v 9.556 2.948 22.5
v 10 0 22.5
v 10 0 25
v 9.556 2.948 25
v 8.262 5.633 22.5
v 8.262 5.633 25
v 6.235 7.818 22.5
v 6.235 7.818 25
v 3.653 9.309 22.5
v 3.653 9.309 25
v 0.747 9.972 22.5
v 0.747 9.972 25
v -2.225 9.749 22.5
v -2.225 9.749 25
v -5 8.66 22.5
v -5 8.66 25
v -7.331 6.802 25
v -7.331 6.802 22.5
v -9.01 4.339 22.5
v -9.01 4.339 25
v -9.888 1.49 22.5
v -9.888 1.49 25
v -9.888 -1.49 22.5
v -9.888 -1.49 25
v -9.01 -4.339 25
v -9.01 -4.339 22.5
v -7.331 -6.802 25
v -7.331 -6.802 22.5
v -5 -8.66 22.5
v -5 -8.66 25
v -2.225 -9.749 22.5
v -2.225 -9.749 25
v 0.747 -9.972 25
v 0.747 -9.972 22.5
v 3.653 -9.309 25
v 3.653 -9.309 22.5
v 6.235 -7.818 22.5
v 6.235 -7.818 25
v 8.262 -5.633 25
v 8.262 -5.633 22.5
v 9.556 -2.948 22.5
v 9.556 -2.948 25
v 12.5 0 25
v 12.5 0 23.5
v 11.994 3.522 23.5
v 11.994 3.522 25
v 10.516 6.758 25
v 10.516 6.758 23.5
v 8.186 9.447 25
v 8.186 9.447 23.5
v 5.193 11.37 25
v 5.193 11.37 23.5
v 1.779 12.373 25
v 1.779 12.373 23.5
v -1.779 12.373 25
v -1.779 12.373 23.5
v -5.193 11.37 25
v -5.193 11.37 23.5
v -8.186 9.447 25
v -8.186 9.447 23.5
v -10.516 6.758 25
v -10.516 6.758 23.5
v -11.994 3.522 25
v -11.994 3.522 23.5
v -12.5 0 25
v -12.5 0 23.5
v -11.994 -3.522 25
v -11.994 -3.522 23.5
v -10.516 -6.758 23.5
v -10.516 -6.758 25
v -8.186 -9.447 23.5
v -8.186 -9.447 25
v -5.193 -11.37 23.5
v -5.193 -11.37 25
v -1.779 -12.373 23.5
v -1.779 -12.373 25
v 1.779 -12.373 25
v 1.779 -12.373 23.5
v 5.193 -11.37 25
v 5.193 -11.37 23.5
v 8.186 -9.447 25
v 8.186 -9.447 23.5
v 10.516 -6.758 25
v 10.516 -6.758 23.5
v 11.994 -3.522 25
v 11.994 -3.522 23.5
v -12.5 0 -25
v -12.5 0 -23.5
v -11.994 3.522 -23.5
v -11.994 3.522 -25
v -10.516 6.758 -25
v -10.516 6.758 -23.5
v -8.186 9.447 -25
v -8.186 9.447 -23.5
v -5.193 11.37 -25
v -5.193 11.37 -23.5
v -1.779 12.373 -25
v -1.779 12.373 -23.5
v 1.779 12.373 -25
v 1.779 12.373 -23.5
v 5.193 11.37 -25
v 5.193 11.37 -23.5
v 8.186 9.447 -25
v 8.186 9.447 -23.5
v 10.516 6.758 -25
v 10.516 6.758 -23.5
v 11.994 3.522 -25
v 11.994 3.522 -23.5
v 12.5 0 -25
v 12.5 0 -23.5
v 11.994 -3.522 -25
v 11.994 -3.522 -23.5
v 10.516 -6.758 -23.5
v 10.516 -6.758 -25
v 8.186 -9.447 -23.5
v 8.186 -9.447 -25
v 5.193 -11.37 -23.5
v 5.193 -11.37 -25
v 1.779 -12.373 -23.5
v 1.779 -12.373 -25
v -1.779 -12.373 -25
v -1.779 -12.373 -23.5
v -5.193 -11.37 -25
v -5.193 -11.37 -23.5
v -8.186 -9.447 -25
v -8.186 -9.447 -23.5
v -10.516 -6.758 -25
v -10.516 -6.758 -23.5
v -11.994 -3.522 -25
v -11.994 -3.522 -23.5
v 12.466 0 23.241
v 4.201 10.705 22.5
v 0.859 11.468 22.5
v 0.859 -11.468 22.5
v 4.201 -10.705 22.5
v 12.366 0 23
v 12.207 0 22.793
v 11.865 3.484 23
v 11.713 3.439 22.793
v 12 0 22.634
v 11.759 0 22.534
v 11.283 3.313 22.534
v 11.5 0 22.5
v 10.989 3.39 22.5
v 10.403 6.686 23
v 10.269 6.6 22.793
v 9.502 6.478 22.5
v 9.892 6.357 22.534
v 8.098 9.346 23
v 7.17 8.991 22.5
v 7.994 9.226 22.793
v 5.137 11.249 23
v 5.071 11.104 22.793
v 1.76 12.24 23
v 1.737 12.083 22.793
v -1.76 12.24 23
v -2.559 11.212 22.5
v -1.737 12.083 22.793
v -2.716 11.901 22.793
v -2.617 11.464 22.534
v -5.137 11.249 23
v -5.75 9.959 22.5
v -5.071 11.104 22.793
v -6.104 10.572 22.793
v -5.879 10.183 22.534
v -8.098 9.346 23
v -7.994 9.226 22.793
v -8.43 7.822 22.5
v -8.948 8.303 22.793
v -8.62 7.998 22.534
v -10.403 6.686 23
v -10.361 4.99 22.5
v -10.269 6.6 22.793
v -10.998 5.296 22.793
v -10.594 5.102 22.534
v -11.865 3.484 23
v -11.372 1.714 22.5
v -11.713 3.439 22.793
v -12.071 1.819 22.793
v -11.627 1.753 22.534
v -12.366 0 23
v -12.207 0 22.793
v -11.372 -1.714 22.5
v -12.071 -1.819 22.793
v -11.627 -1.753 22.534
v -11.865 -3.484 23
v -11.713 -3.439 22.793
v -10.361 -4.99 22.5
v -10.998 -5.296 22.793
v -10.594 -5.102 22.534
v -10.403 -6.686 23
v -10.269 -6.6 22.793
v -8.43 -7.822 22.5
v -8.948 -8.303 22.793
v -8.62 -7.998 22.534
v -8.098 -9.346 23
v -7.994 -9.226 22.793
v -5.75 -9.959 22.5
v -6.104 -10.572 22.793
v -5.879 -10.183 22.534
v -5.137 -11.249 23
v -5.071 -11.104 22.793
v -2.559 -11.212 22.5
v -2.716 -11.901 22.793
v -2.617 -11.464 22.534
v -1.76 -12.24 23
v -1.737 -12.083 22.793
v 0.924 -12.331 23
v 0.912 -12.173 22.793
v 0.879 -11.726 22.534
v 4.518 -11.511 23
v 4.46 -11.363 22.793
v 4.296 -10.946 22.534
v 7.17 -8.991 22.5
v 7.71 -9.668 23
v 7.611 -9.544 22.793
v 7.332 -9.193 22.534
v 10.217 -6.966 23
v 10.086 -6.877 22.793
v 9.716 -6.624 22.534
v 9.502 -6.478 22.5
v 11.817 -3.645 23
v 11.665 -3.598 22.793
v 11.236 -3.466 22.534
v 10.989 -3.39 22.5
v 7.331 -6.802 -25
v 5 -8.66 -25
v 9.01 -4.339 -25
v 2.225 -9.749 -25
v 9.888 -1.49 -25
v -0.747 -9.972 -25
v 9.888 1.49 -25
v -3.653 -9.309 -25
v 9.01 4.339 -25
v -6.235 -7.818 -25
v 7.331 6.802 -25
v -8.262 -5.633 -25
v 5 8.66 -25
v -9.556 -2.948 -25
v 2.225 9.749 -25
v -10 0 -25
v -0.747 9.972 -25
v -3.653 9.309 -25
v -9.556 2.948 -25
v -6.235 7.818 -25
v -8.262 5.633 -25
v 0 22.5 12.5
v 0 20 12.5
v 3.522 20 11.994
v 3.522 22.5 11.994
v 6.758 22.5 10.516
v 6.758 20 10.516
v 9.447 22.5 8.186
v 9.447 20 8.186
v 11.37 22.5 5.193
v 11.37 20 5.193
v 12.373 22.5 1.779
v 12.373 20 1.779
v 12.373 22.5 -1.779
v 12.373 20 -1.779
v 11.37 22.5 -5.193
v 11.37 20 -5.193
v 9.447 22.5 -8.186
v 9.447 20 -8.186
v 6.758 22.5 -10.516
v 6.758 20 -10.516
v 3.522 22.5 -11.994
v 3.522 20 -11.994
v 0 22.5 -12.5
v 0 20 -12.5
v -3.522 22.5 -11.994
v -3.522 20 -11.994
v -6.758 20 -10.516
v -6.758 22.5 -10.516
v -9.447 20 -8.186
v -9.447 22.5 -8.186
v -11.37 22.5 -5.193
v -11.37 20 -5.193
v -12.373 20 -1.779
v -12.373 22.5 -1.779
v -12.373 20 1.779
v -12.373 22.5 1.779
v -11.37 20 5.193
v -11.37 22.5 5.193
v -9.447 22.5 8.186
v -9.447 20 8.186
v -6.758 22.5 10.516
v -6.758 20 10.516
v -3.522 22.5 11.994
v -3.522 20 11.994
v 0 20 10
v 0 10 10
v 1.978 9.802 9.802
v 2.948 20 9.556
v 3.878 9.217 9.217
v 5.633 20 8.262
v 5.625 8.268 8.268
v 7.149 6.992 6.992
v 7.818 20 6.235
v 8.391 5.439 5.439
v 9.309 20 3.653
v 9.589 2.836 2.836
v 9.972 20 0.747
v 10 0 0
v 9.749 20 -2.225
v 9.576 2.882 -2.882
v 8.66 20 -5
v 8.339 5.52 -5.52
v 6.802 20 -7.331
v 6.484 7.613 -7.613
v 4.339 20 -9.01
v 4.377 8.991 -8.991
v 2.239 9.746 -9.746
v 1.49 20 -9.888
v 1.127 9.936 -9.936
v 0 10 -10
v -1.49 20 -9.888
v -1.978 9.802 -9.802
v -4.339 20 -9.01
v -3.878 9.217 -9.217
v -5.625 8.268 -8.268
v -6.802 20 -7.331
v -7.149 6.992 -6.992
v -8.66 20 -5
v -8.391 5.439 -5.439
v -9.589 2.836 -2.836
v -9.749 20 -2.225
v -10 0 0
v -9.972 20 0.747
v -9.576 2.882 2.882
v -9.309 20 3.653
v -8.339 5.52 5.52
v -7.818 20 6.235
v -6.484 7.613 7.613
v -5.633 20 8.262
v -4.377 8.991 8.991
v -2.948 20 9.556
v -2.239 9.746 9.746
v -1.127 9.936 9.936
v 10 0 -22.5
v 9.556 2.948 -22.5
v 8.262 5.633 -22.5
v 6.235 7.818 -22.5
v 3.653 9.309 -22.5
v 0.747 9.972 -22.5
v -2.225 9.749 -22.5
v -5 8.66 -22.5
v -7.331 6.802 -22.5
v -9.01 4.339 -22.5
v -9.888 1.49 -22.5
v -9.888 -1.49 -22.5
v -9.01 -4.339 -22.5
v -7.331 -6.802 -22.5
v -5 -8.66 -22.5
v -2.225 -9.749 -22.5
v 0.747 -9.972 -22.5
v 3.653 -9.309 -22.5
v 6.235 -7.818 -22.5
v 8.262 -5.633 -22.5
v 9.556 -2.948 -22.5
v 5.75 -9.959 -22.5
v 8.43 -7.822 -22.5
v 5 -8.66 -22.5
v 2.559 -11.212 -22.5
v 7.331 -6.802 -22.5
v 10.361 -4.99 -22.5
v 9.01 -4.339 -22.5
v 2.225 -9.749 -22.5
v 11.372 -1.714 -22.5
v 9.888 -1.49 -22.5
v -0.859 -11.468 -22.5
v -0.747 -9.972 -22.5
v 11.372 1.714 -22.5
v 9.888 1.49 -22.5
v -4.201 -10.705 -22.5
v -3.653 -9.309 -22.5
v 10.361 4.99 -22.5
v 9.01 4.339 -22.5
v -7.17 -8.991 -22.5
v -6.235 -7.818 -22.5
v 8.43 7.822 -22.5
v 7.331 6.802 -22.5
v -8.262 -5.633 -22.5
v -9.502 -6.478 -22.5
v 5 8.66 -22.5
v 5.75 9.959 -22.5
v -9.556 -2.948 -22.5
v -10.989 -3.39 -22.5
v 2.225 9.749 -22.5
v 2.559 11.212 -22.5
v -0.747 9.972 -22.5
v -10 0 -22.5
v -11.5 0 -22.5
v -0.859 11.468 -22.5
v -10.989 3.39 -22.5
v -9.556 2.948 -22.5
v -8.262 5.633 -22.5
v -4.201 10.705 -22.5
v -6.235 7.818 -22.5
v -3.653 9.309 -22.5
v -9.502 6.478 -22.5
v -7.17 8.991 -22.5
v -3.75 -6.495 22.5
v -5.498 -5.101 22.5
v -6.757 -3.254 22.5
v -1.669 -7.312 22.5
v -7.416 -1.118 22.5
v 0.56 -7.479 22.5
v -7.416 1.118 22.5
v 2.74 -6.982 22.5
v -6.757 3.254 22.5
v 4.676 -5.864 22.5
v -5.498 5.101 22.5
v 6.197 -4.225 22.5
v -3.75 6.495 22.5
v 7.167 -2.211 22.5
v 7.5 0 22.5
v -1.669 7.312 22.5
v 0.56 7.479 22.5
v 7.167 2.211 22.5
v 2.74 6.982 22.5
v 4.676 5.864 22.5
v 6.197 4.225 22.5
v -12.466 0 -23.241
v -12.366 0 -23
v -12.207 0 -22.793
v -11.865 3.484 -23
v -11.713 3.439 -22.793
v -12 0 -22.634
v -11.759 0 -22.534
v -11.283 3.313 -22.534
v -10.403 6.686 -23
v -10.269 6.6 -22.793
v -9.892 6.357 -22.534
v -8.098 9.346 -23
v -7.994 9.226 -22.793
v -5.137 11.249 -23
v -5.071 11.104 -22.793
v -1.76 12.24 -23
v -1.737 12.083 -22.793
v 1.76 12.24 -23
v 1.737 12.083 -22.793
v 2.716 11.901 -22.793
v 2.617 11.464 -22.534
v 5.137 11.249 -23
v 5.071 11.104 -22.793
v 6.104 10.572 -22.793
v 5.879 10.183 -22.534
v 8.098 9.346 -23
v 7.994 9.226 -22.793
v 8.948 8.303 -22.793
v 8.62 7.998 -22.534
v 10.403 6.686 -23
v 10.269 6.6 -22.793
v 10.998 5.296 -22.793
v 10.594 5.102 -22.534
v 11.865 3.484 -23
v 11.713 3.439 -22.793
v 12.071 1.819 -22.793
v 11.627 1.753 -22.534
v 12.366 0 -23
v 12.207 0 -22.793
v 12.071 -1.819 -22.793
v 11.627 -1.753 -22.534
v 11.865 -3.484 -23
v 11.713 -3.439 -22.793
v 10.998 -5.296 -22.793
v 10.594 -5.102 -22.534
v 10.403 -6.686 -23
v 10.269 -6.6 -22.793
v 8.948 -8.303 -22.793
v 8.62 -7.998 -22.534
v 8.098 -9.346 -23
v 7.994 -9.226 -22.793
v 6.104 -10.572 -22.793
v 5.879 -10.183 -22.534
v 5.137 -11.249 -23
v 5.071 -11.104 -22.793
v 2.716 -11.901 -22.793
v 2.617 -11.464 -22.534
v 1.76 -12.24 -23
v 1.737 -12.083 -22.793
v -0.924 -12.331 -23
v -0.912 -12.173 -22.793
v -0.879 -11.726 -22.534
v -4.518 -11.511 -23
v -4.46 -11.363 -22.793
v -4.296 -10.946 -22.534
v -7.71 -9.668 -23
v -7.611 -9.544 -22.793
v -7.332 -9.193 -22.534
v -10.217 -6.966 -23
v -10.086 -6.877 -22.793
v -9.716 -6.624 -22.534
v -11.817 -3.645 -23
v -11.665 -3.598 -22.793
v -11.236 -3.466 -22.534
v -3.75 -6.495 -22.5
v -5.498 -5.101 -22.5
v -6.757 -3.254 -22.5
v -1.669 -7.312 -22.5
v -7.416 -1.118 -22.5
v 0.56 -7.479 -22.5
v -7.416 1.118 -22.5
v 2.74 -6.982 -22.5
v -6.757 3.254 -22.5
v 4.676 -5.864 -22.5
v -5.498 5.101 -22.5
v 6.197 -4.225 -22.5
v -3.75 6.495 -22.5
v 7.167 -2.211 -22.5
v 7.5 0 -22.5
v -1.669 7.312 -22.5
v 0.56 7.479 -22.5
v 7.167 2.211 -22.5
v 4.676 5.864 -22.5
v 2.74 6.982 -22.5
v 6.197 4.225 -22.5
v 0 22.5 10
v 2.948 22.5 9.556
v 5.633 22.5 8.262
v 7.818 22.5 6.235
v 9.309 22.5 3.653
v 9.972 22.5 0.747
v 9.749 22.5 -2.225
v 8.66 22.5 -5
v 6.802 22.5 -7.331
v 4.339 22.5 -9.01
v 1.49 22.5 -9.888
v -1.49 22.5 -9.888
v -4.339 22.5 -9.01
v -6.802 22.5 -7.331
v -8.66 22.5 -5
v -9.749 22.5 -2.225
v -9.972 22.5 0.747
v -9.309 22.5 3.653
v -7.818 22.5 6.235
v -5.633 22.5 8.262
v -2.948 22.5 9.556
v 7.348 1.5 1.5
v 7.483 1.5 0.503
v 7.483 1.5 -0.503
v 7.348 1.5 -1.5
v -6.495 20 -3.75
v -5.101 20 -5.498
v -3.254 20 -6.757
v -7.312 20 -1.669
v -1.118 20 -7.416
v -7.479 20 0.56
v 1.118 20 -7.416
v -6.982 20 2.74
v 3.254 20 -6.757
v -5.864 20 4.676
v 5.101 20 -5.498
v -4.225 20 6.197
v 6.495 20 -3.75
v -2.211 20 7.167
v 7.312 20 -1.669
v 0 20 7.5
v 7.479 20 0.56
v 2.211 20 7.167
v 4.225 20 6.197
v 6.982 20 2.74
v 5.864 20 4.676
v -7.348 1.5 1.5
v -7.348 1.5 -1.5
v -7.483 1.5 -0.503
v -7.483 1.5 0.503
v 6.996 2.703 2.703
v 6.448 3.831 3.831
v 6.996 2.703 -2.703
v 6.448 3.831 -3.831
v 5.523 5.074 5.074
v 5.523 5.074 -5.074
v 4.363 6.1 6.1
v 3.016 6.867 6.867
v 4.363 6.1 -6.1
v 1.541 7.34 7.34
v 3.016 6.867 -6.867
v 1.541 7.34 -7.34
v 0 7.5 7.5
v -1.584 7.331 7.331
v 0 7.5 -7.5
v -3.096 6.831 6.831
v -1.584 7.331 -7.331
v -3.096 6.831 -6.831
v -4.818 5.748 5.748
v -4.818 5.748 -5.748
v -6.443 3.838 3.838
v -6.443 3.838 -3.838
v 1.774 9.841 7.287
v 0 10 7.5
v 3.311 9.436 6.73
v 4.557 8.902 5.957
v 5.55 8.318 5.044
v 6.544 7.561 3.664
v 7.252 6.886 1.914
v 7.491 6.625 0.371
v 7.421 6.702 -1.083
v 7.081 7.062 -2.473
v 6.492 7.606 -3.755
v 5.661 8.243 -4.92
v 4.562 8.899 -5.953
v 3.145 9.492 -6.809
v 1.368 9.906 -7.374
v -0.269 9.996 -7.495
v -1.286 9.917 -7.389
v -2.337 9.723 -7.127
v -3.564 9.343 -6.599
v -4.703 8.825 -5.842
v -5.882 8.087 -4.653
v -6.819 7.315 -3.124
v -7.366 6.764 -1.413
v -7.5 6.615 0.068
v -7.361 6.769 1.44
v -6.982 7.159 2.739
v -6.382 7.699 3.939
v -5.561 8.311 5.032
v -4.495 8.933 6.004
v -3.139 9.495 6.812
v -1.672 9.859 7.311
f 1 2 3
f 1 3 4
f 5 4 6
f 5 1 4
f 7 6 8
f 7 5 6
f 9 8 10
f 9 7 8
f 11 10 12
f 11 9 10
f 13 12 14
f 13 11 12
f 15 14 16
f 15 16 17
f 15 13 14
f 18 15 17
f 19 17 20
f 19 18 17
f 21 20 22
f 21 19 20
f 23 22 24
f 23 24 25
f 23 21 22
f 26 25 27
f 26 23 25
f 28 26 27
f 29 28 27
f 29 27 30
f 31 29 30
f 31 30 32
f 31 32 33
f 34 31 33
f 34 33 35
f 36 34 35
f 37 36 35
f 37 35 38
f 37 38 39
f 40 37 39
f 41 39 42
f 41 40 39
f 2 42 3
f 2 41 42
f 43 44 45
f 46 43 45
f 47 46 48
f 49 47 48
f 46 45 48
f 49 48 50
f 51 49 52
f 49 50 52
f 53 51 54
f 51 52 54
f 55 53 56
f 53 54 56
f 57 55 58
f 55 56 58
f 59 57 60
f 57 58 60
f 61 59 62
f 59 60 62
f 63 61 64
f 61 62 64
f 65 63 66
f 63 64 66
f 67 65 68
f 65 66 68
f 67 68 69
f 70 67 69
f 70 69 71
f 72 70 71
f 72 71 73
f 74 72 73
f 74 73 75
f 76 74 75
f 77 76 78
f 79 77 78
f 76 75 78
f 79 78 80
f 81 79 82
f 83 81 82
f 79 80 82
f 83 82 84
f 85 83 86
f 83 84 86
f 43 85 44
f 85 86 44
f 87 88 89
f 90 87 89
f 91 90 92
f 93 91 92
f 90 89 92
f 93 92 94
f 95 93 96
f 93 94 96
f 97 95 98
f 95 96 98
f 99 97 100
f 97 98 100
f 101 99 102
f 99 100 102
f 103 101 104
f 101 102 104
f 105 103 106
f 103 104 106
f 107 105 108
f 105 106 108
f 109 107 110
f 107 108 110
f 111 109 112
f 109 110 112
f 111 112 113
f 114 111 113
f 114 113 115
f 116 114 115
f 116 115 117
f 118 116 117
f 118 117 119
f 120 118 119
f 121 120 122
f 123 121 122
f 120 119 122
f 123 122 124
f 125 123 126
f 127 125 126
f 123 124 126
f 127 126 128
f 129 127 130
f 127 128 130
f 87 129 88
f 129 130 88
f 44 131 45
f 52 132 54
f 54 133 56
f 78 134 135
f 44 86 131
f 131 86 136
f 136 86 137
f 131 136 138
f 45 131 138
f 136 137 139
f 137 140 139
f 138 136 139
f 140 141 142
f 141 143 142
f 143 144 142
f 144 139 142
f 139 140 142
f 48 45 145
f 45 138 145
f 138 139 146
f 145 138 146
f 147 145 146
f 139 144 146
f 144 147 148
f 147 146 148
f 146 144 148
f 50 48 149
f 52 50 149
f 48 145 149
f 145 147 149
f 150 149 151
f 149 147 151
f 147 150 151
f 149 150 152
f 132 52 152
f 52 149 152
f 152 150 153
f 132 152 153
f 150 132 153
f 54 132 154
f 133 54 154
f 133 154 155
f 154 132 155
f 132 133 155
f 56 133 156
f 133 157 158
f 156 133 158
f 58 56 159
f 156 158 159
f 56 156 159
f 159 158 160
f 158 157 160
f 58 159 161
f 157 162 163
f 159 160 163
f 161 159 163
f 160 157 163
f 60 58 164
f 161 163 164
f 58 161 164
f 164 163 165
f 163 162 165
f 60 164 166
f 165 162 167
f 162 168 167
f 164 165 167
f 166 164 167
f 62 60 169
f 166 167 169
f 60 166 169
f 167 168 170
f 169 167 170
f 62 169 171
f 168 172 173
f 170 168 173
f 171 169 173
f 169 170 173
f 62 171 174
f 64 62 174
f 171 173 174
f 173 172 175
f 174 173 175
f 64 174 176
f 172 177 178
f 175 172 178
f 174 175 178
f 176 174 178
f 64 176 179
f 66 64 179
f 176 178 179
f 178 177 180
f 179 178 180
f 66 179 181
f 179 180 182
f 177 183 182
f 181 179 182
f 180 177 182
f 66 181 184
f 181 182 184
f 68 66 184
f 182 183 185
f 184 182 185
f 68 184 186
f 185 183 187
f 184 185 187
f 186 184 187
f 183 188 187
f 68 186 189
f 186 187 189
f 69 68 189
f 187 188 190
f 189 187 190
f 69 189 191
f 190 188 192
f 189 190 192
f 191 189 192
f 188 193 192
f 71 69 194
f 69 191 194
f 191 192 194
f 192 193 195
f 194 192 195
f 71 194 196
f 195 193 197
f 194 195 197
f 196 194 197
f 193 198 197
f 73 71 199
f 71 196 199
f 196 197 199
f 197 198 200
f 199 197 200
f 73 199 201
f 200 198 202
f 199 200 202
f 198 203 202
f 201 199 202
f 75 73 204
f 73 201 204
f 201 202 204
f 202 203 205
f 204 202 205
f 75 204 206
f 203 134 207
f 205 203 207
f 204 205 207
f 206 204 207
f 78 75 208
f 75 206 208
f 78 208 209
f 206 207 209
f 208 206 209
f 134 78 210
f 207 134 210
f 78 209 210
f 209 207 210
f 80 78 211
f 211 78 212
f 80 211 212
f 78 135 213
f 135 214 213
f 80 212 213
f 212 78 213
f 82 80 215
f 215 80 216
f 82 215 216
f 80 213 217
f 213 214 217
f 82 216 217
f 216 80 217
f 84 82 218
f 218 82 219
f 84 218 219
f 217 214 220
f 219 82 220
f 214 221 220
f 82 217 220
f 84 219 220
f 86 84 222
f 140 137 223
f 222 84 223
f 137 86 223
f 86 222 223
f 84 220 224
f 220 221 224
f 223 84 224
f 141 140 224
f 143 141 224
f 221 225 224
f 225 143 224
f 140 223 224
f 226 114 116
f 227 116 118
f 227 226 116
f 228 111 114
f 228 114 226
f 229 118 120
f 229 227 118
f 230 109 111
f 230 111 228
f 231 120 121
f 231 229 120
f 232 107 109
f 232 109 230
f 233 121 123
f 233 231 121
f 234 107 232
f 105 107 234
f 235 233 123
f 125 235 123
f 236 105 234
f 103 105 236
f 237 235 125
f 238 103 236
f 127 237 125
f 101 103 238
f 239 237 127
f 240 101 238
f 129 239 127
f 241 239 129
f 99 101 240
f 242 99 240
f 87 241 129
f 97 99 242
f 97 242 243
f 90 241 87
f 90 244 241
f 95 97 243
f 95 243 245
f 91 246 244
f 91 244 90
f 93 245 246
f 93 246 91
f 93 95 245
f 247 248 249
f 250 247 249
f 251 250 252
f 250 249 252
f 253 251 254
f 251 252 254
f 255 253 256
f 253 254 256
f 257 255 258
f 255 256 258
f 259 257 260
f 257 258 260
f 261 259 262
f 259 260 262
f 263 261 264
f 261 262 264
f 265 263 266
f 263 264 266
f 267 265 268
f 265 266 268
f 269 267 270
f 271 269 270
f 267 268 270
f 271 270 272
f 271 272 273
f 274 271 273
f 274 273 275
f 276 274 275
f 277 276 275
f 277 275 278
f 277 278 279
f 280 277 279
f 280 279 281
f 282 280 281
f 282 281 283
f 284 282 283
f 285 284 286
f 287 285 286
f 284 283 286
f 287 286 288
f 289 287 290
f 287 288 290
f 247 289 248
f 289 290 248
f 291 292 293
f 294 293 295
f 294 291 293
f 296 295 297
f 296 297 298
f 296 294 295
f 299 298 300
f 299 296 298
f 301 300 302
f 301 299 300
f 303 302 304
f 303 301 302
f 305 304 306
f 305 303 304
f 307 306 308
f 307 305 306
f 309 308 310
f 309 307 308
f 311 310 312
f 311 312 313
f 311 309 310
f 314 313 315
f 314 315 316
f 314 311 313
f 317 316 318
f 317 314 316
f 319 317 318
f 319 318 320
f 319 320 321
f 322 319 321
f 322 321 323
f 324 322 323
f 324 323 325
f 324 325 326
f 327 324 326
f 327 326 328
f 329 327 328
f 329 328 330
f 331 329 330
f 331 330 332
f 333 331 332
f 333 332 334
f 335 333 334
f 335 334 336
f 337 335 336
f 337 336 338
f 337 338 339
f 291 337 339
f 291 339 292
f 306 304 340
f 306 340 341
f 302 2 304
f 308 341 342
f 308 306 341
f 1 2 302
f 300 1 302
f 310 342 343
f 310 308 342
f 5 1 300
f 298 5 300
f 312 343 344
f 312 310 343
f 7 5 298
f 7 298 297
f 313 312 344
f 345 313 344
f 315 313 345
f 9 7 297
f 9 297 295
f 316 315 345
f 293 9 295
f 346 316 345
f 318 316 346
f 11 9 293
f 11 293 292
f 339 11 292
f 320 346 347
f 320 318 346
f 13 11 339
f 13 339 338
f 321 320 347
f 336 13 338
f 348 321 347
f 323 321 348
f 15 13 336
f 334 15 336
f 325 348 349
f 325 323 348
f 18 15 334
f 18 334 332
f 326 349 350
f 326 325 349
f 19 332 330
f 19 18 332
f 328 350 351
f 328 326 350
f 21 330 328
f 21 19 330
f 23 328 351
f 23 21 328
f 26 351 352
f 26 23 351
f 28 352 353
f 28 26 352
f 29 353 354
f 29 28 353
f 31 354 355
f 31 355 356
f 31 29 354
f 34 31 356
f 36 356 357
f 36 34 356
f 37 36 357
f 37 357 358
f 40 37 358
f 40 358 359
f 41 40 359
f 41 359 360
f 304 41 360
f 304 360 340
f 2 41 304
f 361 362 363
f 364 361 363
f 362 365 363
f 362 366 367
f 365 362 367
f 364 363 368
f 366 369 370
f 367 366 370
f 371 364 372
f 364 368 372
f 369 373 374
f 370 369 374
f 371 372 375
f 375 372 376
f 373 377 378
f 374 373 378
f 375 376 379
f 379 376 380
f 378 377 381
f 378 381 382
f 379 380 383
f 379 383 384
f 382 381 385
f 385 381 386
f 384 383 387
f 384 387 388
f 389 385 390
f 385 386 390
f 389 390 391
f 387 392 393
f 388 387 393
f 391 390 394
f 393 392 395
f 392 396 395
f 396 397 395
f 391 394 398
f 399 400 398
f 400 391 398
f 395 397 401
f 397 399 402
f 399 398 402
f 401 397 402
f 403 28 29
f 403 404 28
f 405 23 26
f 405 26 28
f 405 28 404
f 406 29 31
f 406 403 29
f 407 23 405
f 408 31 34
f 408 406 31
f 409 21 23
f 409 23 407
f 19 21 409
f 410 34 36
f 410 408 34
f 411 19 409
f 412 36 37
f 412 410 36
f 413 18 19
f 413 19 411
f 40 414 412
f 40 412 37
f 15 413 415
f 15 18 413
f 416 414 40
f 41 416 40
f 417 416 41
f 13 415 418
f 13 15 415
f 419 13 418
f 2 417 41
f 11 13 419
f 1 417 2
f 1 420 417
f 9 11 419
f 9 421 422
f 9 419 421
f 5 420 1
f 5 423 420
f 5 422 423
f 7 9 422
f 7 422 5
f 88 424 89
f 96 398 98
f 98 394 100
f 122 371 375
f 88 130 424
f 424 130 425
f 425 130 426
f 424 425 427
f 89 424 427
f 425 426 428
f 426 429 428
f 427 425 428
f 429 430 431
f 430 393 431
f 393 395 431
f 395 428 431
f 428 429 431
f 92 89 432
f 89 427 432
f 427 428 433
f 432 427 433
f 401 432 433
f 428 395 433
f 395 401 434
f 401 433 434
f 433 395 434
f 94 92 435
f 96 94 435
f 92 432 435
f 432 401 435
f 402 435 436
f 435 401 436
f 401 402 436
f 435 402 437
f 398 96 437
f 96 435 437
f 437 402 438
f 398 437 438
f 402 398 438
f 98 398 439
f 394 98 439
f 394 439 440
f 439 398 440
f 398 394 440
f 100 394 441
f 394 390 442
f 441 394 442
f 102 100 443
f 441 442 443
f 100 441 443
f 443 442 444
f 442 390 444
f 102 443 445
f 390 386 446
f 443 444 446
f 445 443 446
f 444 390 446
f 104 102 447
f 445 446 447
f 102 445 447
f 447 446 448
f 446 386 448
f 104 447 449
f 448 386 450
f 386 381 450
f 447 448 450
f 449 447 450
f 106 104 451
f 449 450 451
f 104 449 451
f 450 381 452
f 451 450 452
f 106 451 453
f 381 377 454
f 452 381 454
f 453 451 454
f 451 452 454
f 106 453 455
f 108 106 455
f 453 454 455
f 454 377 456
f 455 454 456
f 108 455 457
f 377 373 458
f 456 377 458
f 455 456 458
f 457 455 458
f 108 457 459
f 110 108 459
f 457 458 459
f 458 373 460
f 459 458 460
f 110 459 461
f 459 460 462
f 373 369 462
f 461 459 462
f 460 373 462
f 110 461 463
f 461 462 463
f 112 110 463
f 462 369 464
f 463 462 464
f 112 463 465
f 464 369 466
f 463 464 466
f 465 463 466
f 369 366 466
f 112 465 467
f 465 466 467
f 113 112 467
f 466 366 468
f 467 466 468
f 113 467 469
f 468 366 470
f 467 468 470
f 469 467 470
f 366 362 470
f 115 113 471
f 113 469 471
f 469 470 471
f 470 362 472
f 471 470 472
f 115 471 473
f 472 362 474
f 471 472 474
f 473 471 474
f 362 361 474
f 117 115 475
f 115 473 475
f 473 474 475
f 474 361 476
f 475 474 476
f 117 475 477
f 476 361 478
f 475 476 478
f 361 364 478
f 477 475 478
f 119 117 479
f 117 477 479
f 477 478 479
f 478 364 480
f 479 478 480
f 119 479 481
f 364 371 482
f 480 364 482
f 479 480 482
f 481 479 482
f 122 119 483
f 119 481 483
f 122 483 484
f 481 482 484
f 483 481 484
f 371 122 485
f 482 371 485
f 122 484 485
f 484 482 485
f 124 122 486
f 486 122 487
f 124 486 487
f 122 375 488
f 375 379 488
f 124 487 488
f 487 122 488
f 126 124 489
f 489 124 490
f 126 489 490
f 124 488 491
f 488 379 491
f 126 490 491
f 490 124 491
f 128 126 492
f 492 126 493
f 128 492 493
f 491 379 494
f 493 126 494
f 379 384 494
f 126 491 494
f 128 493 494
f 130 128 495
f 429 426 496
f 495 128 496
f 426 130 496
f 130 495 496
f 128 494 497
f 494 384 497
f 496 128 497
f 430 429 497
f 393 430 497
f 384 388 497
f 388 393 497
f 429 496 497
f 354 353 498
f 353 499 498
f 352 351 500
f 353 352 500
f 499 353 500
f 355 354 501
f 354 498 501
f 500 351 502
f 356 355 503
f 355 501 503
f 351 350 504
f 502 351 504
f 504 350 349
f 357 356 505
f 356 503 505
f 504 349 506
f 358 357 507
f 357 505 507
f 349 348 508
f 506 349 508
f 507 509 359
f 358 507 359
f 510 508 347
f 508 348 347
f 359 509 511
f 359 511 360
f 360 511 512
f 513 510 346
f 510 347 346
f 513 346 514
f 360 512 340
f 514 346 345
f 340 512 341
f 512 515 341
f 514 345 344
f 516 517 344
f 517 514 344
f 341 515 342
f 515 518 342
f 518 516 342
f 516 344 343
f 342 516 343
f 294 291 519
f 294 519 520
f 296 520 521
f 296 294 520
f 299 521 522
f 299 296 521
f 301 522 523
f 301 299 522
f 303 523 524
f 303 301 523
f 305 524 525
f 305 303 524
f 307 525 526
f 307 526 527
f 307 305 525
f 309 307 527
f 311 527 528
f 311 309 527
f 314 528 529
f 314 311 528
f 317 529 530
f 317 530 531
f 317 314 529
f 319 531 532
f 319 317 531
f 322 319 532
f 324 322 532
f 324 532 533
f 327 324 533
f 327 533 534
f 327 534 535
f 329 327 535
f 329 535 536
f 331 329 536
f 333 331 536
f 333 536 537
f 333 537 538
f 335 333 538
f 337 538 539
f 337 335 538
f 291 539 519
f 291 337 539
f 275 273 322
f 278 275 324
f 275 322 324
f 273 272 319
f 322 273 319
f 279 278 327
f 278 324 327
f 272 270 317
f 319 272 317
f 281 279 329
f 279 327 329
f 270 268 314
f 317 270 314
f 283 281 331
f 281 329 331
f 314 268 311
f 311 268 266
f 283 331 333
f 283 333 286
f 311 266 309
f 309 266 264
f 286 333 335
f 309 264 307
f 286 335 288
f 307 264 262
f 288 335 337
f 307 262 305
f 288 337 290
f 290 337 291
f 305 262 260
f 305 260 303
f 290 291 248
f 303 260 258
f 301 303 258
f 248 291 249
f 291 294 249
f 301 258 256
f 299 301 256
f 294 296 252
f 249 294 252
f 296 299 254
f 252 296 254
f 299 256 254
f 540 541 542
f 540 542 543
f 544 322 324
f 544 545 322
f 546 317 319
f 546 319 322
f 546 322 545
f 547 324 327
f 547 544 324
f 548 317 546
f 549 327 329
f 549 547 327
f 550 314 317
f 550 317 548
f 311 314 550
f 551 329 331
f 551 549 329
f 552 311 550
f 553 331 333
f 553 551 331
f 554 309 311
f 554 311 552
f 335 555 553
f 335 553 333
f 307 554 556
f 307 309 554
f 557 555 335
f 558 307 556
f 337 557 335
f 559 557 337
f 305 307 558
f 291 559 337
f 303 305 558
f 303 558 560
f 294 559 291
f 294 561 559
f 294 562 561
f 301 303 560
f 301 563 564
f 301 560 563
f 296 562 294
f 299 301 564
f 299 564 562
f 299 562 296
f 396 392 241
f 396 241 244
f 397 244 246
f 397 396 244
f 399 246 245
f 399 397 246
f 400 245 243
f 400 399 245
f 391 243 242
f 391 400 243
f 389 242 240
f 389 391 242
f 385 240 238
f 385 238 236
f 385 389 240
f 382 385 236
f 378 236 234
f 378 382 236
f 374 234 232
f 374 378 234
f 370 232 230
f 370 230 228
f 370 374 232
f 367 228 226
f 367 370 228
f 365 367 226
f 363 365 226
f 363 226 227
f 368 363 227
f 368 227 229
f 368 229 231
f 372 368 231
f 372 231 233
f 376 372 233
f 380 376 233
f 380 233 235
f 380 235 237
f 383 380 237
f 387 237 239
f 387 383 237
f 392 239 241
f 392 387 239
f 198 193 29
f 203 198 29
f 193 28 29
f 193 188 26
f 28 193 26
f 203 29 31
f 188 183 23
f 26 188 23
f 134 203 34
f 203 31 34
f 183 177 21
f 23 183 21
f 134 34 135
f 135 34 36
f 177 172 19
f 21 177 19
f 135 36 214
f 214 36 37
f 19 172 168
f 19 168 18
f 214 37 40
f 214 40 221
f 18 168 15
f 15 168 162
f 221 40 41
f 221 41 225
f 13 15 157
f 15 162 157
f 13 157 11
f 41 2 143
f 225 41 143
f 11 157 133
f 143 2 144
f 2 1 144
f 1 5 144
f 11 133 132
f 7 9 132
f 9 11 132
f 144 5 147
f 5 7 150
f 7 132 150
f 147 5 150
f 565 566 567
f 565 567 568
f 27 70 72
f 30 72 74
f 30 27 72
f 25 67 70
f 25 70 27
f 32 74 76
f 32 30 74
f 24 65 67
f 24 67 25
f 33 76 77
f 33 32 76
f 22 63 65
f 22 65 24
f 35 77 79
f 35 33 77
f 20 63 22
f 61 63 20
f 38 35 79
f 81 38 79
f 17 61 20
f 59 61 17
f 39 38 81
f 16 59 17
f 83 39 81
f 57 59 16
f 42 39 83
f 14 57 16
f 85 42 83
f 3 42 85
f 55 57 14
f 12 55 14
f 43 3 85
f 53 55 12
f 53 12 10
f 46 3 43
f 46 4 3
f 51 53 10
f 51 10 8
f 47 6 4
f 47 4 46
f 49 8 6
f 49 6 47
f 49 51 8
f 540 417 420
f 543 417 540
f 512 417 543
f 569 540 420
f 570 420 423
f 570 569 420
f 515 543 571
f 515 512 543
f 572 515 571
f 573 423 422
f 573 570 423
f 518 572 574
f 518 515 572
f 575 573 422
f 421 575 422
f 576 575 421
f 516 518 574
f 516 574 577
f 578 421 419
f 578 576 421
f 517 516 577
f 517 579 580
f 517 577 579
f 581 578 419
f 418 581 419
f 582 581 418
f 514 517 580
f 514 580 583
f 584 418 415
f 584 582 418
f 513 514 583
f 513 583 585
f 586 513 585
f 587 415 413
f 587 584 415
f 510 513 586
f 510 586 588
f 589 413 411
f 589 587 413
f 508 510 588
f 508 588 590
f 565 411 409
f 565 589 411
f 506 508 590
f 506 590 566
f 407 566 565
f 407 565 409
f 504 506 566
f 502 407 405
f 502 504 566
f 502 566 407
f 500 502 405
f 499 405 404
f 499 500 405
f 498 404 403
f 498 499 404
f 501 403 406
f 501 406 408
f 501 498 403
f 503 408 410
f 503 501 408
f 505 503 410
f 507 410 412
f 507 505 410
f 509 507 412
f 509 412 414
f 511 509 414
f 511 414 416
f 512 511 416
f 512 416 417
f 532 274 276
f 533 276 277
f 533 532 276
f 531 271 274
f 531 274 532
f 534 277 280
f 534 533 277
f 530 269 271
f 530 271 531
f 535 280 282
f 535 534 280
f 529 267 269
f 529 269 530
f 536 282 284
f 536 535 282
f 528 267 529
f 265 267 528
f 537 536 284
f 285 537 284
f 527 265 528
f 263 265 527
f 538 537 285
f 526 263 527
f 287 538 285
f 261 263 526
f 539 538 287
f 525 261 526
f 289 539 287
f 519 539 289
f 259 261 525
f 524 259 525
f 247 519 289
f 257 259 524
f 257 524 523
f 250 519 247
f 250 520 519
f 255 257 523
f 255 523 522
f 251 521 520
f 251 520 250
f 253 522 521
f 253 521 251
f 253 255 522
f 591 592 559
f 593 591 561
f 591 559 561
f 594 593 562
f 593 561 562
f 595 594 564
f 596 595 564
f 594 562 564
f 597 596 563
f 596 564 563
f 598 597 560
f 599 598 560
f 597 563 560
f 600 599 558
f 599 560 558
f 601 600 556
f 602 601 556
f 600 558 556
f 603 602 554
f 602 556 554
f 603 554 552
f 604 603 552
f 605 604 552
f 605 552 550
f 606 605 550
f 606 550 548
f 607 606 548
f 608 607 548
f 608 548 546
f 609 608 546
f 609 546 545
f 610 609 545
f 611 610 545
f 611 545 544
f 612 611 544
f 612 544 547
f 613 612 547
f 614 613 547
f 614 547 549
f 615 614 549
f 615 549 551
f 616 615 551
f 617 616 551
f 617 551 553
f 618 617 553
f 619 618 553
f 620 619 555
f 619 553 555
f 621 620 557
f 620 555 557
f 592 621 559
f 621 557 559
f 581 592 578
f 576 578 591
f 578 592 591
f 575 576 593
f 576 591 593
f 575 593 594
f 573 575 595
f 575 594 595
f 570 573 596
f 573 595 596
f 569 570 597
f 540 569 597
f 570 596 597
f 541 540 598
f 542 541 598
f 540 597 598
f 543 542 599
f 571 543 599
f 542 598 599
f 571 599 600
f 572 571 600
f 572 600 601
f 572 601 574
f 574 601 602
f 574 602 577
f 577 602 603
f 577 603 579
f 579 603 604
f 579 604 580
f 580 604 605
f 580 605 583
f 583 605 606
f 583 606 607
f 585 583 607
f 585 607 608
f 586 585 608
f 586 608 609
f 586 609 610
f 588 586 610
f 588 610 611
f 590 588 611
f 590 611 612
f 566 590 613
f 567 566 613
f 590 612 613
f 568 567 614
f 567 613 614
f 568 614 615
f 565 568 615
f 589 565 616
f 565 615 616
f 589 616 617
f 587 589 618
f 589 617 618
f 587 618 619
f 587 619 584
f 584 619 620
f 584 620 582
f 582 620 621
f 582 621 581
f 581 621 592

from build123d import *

# Parameters (mm, degrees)
CROQUIS2_R                   = 10
CROQUIS2_R_2                 = 7.5
SALIENTE_EXTRUIR1_DEPTH      = 22.5
SALIENTE_EXTRUIR1_DEPTH_BACK = 22.5
CROQUIS3_R                   = 12.5
CROQUIS3_R_2                 = 10
SALIENTE_EXTRUIR2_DEPTH      = 2.5
REDONDEO1_R                  = 1
CROQUIS4_R                   = 12.5
CROQUIS4_R_2                 = 10
SALIENTE_EXTRUIR3_DEPTH      = 2.5
REDONDEO2_R                  = 1
SALIENTE_EXTRUIR4_REACH      = 44.866
SALIENTE_EXTRUIR4_END_RADIUS = 10
CROQUIS5_R                   = 10
CROQUIS5_R_2                 = 7.5
CROQUIS7_R                   = 12.5
CROQUIS7_R_2                 = 10
SALIENTE_EXTRUIR5_DEPTH      = 2.5
CROQUIS8_R                   = 7.5
CORTAR_EXTRUIR4_DEPTH        = 18.5


with BuildPart() as part:
    # Croquis2 → Saliente-Extruir1 (new, two sides)
    with BuildSketch(Plane.XY) as saliente_extruir1_sk:
        Circle(CROQUIS2_R)
        Circle(CROQUIS2_R_2, mode=Mode.SUBTRACT)
    extrude(amount=SALIENTE_EXTRUIR1_DEPTH)
    extrude(saliente_extruir1_sk.sketch, amount=-SALIENTE_EXTRUIR1_DEPTH_BACK)

    # Saliente-Extruir4: up to this cylinder (the profile starts outside it)
    saliente_extruir4_end = Plane(origin=(0, 0, -9.717157), z_dir=(0, 0, 1)) * Cylinder(SALIENTE_EXTRUIR4_END_RADIUS, 110.732, mode=Mode.PRIVATE)
    # Croquis5 → Saliente-Extruir4 (add, up to the surface)
    with BuildSketch(Plane(origin=(0, 20, 0), x_dir=(1, 0, 0), z_dir=(0, 1, 0)), mode=Mode.PRIVATE) as saliente_extruir4_sk1:
        with Locations(Location((0, 0, 0), (0, 0, 270))):
            Circle(CROQUIS5_R)
        with Locations(Location((0, 0, 0), (0, 0, 270))):
            Circle(CROQUIS5_R_2, mode=Mode.SUBTRACT)
    saliente_extruir4_tool1 = extrude(saliente_extruir4_sk1.sketch, amount=-SALIENTE_EXTRUIR4_REACH, mode=Mode.PRIVATE) - saliente_extruir4_end
    add(saliente_extruir4_tool1.solids().sort_by_distance((0, 20, -9.717157))[0])

    # Croquis8 → Cortar-Extruir4 (cut)
    with BuildSketch(Plane(origin=(0, 20, 0), x_dir=(1, 0, 0), z_dir=(0, 1, 0))):
        with Locations(Location((0, 0, 0), (0, 0, 270))):
            Circle(CROQUIS8_R)
    extrude(amount=-CORTAR_EXTRUIR4_DEPTH, mode=Mode.SUBTRACT)


with BuildPart() as body_2:
    # Croquis3 → Saliente-Extruir2 (new body)
    with BuildSketch(Plane.XY.offset(22.5)):
        Circle(CROQUIS3_R)
        Circle(CROQUIS3_R_2, mode=Mode.SUBTRACT)
    extrude(amount=SALIENTE_EXTRUIR2_DEPTH)

    # Redondeo1
    redondeo1_edges = [body_2.edges().sort_by_distance(p)[0] for p in [
        (-12.5, 0, 22.5),
    ]]
    fillet(redondeo1_edges, radius=REDONDEO1_R)


with BuildPart() as body_3:
    # Croquis4 → Saliente-Extruir3 (new body)
    with BuildSketch(Plane(origin=(0, 0, -22.5), x_dir=(-1, 0, 0), z_dir=(0, 0, -1))):
        Circle(CROQUIS4_R)
        Circle(CROQUIS4_R_2, mode=Mode.SUBTRACT)
    extrude(amount=SALIENTE_EXTRUIR3_DEPTH)

    # Redondeo2
    redondeo2_edges = [body_3.edges().sort_by_distance(p)[0] for p in [
        (12.5, 0, -22.5),
    ]]
    fillet(redondeo2_edges, radius=REDONDEO2_R)


with BuildPart() as body_4:
    # Croquis7 → Saliente-Extruir5 (new body)
    with BuildSketch(Plane(origin=(0, 20, 0), x_dir=(1, 0, 0), z_dir=(0, 1, 0))):
        with Locations(Location((0, 0, 0), (0, 0, 270))):
            Circle(CROQUIS7_R)
        with Locations(Location((0, 0, 0), (0, 0, 270))):
            Circle(CROQUIS7_R_2, mode=Mode.SUBTRACT)
    extrude(amount=SALIENTE_EXTRUIR5_DEPTH)


solid = Compound([part.part, body_2.part, body_3.part, body_4.part])
